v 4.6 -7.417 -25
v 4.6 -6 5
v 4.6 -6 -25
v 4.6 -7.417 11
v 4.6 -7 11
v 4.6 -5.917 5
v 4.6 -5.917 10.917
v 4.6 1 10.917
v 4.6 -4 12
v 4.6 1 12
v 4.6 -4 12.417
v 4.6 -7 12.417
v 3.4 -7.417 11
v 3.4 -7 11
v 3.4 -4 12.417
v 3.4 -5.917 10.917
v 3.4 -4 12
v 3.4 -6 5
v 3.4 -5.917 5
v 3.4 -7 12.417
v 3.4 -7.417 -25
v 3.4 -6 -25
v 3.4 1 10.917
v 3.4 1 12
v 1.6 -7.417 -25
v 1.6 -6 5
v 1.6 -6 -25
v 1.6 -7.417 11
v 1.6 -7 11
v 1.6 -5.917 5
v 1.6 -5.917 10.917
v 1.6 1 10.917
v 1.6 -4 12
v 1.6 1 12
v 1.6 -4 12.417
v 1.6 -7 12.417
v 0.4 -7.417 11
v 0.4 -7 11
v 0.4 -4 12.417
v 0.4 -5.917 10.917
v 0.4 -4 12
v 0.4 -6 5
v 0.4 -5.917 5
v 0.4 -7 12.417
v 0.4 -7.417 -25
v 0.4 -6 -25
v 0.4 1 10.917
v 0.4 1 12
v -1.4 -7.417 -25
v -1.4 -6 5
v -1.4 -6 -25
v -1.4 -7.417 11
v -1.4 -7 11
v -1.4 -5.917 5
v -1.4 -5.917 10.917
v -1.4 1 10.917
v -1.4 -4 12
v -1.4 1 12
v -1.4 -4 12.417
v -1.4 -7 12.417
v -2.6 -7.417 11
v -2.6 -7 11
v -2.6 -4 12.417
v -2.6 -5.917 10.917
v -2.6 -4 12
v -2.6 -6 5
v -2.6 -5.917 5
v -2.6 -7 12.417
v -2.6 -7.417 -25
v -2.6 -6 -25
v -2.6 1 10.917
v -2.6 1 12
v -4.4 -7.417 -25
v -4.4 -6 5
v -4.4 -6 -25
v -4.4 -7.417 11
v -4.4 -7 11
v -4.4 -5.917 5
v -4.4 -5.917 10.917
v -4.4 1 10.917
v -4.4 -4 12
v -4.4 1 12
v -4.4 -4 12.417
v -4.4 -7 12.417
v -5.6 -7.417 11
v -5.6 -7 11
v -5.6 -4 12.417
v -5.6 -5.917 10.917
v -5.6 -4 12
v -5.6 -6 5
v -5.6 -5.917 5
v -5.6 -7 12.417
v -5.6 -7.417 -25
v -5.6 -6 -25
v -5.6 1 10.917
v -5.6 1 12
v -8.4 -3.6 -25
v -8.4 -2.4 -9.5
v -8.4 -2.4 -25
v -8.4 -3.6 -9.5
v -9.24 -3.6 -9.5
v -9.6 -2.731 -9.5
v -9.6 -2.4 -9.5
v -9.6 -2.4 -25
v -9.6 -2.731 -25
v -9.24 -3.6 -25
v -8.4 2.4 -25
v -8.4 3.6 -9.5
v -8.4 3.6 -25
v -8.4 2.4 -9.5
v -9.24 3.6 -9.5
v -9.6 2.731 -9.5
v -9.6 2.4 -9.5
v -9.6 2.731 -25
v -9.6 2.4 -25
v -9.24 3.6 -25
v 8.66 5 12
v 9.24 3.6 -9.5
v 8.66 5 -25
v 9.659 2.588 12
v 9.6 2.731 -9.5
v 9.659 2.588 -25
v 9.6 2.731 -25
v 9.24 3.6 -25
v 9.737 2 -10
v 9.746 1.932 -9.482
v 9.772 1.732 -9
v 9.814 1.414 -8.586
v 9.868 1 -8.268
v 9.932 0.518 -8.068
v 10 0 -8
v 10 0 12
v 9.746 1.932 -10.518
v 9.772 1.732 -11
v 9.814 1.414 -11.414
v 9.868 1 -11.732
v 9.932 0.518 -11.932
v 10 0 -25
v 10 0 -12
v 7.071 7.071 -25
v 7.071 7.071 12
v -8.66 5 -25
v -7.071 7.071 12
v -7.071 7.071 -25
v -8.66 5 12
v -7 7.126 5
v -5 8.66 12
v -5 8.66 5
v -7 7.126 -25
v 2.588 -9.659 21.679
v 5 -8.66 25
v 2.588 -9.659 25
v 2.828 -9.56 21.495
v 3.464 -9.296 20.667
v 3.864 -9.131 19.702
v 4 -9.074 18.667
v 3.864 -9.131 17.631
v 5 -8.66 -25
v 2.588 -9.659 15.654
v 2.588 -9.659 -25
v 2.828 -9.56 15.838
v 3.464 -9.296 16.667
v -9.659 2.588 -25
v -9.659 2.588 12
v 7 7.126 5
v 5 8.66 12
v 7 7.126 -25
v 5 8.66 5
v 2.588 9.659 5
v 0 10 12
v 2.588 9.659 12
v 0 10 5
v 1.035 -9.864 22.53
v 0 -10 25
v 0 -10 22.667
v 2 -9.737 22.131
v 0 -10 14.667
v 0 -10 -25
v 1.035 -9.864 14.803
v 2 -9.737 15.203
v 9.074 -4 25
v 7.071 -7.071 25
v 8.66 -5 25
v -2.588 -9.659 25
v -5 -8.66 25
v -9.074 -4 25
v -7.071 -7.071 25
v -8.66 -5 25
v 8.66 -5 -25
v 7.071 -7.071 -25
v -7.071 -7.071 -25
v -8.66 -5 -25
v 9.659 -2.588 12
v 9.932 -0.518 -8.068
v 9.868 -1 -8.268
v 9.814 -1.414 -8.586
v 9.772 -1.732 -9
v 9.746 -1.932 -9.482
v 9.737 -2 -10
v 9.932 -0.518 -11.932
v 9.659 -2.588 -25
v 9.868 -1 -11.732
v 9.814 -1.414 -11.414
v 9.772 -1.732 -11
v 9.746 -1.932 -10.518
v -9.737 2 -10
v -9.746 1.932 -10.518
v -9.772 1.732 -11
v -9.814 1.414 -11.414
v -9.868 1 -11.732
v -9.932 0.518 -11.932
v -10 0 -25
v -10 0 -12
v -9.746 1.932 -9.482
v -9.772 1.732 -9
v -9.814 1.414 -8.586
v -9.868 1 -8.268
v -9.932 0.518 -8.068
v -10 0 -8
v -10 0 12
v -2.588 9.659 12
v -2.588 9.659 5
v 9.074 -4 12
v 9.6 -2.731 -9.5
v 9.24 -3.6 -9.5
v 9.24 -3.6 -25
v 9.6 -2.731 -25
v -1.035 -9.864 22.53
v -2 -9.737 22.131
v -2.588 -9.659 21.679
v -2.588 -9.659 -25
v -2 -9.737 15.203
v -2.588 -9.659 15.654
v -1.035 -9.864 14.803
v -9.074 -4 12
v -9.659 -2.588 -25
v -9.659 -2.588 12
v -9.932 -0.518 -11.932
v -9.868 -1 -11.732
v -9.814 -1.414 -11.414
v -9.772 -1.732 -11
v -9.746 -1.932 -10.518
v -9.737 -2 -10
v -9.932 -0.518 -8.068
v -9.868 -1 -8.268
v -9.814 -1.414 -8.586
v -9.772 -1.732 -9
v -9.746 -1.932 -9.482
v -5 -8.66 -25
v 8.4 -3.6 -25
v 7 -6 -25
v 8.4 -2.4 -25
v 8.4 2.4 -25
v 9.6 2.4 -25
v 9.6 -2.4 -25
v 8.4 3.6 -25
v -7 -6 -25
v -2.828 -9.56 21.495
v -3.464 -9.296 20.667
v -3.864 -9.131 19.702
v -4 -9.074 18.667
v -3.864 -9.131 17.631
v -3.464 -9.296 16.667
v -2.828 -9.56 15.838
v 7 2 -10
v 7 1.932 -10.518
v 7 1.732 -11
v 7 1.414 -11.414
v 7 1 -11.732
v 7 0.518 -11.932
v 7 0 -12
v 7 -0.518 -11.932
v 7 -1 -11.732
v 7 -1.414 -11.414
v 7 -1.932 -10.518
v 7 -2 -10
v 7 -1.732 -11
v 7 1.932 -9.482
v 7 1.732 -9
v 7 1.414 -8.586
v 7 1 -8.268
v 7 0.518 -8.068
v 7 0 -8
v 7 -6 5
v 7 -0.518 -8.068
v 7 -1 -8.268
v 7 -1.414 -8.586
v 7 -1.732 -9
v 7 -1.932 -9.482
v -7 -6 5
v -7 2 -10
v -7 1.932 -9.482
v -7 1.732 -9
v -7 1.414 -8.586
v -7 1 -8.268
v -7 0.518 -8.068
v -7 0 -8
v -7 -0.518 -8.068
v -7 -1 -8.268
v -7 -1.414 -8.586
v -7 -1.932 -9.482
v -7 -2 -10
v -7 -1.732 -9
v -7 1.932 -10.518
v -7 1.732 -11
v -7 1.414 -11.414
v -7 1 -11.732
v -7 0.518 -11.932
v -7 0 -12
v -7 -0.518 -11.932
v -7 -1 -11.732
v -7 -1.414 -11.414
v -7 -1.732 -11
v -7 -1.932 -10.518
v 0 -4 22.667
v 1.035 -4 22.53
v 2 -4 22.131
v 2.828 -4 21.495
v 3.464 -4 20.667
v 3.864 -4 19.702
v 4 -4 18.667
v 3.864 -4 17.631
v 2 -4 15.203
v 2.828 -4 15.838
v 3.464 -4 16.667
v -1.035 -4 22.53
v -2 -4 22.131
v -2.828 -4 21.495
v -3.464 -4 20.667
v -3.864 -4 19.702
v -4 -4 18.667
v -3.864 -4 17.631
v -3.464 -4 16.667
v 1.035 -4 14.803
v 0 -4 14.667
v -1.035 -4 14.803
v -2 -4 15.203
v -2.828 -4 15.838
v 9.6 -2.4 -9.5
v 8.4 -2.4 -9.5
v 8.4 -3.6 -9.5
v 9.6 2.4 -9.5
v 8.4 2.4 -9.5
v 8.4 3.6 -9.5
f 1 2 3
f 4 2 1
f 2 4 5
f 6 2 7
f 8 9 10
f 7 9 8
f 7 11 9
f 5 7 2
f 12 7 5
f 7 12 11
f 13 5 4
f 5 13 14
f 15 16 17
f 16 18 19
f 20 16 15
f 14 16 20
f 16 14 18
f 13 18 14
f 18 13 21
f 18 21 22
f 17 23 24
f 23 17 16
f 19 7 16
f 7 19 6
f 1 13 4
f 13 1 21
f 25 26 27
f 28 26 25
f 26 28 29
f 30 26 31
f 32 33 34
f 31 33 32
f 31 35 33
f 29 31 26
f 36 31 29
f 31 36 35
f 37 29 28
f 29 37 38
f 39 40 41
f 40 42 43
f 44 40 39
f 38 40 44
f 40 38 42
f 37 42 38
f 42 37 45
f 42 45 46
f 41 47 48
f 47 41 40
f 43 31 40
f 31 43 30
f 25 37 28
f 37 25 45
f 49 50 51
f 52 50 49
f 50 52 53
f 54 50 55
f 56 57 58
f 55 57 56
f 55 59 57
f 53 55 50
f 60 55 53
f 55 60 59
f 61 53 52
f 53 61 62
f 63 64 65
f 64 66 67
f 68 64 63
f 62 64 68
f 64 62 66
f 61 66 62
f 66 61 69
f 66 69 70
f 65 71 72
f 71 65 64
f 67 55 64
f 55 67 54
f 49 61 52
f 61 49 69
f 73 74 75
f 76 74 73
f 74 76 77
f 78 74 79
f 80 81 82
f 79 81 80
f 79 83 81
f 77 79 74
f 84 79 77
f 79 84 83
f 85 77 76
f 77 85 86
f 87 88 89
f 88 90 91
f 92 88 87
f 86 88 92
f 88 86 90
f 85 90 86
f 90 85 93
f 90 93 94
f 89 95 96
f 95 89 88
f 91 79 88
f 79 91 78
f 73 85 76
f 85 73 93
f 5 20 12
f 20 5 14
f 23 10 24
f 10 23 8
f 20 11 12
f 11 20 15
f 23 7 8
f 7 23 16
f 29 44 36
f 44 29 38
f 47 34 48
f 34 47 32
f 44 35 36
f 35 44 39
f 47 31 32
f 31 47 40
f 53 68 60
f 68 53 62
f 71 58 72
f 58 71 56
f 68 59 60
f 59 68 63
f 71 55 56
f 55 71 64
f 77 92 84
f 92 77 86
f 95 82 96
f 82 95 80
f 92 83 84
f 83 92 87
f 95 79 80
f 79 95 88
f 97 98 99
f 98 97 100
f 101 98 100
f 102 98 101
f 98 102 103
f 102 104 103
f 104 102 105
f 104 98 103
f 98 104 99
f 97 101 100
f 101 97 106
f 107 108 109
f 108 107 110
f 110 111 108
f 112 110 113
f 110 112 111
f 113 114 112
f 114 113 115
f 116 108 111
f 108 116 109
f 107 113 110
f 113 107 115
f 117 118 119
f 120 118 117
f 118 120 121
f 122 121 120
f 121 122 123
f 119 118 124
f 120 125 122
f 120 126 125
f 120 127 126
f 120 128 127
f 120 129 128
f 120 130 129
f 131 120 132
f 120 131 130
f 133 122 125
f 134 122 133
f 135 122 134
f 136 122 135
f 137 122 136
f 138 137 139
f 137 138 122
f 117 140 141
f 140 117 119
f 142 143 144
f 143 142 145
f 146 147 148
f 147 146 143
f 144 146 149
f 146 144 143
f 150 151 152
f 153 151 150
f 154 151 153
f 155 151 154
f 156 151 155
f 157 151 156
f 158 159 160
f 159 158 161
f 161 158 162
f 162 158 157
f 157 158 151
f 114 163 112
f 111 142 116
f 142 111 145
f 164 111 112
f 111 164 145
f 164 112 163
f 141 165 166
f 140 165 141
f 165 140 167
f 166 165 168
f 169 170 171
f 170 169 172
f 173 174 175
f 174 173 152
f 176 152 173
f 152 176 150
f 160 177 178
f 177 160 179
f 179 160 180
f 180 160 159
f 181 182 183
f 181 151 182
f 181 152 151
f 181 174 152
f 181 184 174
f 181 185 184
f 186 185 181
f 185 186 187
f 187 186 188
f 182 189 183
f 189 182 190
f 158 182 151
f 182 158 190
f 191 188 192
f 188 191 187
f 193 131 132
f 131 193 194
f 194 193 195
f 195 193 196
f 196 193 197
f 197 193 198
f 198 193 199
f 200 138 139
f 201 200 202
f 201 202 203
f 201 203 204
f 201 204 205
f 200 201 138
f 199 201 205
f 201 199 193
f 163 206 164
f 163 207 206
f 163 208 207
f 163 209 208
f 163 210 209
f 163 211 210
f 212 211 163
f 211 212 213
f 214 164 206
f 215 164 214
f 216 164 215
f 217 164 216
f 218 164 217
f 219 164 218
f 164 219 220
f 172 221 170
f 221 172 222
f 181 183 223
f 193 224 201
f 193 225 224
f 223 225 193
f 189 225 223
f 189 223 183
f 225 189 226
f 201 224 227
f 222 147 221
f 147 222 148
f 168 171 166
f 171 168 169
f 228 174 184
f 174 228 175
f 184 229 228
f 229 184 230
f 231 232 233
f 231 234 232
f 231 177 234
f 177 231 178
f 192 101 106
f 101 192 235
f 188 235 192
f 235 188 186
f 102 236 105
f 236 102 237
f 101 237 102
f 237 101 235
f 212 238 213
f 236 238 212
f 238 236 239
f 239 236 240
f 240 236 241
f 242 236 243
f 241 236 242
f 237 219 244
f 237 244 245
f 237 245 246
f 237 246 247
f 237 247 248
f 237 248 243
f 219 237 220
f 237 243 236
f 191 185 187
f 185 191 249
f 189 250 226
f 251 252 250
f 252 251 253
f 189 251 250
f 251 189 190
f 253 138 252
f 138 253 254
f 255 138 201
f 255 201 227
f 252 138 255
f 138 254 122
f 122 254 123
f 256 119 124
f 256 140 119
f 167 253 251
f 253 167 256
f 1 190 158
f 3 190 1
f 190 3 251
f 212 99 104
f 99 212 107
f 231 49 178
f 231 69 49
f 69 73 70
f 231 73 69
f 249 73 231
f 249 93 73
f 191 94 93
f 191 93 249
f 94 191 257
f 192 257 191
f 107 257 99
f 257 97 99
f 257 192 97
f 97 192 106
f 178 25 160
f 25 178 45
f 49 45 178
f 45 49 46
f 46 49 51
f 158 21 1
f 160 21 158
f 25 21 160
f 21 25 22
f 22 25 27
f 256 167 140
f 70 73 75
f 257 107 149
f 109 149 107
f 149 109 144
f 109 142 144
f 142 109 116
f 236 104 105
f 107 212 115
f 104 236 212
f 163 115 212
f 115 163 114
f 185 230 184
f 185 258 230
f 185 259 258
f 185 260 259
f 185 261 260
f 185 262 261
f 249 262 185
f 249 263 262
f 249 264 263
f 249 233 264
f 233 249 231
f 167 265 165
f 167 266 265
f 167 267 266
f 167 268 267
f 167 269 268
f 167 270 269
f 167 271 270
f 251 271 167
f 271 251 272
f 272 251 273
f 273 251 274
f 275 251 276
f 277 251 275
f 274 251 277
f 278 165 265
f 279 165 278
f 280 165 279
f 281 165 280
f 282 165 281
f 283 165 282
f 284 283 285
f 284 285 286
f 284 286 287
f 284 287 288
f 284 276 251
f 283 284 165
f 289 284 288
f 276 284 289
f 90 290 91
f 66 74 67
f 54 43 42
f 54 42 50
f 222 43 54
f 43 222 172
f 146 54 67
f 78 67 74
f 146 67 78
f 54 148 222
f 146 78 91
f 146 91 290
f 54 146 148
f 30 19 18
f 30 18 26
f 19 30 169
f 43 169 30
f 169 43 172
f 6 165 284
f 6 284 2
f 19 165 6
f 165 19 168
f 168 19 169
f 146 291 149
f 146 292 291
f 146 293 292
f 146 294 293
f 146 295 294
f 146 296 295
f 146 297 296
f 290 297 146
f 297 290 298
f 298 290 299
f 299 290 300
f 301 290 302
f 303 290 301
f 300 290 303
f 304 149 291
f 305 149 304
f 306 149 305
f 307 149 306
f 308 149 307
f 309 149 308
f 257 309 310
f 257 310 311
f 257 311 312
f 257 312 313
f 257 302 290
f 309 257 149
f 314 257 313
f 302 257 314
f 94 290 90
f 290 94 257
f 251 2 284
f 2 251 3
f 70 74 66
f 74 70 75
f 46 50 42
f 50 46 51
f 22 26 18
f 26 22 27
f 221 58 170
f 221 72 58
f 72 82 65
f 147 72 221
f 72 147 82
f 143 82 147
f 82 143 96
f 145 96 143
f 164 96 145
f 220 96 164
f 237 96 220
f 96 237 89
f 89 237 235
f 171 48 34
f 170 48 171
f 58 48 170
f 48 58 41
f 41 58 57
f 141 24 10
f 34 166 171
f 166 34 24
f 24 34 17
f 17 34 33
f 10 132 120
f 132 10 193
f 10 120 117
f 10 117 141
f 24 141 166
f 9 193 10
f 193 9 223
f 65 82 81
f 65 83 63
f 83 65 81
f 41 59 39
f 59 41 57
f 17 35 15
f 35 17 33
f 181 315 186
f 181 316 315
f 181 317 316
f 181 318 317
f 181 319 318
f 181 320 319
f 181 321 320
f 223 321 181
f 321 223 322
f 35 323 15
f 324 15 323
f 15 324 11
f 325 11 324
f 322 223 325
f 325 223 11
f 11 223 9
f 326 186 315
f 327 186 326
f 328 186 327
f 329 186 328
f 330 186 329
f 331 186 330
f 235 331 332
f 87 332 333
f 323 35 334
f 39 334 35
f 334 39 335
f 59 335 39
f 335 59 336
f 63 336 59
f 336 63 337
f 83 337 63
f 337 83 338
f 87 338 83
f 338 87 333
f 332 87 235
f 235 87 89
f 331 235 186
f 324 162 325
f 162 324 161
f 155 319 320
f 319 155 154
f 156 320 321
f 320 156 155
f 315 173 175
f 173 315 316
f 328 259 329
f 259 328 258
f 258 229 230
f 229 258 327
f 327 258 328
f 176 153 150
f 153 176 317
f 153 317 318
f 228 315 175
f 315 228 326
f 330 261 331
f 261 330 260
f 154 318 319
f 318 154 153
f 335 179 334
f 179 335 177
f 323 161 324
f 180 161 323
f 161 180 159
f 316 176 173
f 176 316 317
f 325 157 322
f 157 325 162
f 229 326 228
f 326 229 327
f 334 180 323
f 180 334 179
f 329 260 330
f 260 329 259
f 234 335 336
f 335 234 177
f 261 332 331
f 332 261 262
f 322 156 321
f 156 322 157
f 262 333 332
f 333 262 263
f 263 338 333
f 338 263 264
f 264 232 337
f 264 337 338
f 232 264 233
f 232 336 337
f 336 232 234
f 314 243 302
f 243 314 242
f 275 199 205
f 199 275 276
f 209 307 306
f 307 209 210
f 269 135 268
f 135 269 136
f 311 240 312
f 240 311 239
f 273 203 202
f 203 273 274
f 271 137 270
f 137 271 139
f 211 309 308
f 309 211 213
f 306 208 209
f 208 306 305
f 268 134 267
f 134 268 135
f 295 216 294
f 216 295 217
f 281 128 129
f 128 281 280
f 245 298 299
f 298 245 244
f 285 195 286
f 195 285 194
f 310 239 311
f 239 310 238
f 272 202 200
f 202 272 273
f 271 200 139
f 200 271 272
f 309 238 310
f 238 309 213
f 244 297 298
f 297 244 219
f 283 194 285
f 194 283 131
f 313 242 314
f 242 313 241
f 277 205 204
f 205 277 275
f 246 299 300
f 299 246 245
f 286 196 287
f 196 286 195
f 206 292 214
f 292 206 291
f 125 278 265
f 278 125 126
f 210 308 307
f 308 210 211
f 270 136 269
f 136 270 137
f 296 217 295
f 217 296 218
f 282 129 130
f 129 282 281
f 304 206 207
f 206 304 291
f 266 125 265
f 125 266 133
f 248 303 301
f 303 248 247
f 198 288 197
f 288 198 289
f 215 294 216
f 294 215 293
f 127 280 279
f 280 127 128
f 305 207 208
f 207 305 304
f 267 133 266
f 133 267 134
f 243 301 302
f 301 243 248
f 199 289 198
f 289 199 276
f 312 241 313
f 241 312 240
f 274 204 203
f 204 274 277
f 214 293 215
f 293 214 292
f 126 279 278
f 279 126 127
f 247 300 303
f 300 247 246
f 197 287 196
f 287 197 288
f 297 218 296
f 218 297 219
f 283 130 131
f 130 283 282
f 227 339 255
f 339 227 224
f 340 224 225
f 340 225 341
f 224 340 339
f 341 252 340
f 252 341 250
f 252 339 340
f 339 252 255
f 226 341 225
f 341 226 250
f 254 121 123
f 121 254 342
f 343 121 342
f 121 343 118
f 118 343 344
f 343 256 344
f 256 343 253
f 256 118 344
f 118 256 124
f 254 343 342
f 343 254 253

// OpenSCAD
height = 50;

module plug(d) 
{
rad = d/2;
q = d/3;

	difference() 
	{
	  cylinder(r=rad, h=height, center=true, $fn=24);
	  translate([0,rad/2,rad/2-height/2])
		 cube([d-6,d+2,height],center=true);
     translate([0,d-4,height/2])
       cube([2*d,2*d,d+6],center=true);
     translate([0,0,2+height/3])
        rotate([90,0,0])
          cylinder(r=4,h=20,center=true,$fn=24);

     translate([0,0,-rad])
     rotate([0,90,0])
          cylinder(r=2,h=20,center=true,$fn=24);

   for ( x = [4 : -3 : -6])
     translate([x,-q,-rad])
            cube([1.2,1.5,height-8],center=true);

translate([0,d-13,height/2-q])   
rotate([90,0,0])
   for ( x = [4 : -3 : -6])
     translate([x,-q,rad])
            cube([1.2,1.5,8],center=true);
   translate([rad-1,-3,3-height/2]) cube([1.2,1.2,height/2],center=true);
translate([rad-1,3,3-height/2]) cube([1.2,1.2,height/2],center=true);

   translate([2-d,0,0]) {
   translate([rad-1,-3,3-height/2]) cube([1.2,1.2,height/2],center=true);
translate([rad-1,3,3-height/2]) cube([1.2,1.2,height/2],center=true);
	}
//     translate([0,0,0])
//            cube([2,2,height]);
//	  rotate([0,0,90])
//	   translate([0,0,-q])
//		cube([rad,q,q],center=true);
  } // End of difference()
 // sphere(rad-2.5,center=true);
}

plug(20);
